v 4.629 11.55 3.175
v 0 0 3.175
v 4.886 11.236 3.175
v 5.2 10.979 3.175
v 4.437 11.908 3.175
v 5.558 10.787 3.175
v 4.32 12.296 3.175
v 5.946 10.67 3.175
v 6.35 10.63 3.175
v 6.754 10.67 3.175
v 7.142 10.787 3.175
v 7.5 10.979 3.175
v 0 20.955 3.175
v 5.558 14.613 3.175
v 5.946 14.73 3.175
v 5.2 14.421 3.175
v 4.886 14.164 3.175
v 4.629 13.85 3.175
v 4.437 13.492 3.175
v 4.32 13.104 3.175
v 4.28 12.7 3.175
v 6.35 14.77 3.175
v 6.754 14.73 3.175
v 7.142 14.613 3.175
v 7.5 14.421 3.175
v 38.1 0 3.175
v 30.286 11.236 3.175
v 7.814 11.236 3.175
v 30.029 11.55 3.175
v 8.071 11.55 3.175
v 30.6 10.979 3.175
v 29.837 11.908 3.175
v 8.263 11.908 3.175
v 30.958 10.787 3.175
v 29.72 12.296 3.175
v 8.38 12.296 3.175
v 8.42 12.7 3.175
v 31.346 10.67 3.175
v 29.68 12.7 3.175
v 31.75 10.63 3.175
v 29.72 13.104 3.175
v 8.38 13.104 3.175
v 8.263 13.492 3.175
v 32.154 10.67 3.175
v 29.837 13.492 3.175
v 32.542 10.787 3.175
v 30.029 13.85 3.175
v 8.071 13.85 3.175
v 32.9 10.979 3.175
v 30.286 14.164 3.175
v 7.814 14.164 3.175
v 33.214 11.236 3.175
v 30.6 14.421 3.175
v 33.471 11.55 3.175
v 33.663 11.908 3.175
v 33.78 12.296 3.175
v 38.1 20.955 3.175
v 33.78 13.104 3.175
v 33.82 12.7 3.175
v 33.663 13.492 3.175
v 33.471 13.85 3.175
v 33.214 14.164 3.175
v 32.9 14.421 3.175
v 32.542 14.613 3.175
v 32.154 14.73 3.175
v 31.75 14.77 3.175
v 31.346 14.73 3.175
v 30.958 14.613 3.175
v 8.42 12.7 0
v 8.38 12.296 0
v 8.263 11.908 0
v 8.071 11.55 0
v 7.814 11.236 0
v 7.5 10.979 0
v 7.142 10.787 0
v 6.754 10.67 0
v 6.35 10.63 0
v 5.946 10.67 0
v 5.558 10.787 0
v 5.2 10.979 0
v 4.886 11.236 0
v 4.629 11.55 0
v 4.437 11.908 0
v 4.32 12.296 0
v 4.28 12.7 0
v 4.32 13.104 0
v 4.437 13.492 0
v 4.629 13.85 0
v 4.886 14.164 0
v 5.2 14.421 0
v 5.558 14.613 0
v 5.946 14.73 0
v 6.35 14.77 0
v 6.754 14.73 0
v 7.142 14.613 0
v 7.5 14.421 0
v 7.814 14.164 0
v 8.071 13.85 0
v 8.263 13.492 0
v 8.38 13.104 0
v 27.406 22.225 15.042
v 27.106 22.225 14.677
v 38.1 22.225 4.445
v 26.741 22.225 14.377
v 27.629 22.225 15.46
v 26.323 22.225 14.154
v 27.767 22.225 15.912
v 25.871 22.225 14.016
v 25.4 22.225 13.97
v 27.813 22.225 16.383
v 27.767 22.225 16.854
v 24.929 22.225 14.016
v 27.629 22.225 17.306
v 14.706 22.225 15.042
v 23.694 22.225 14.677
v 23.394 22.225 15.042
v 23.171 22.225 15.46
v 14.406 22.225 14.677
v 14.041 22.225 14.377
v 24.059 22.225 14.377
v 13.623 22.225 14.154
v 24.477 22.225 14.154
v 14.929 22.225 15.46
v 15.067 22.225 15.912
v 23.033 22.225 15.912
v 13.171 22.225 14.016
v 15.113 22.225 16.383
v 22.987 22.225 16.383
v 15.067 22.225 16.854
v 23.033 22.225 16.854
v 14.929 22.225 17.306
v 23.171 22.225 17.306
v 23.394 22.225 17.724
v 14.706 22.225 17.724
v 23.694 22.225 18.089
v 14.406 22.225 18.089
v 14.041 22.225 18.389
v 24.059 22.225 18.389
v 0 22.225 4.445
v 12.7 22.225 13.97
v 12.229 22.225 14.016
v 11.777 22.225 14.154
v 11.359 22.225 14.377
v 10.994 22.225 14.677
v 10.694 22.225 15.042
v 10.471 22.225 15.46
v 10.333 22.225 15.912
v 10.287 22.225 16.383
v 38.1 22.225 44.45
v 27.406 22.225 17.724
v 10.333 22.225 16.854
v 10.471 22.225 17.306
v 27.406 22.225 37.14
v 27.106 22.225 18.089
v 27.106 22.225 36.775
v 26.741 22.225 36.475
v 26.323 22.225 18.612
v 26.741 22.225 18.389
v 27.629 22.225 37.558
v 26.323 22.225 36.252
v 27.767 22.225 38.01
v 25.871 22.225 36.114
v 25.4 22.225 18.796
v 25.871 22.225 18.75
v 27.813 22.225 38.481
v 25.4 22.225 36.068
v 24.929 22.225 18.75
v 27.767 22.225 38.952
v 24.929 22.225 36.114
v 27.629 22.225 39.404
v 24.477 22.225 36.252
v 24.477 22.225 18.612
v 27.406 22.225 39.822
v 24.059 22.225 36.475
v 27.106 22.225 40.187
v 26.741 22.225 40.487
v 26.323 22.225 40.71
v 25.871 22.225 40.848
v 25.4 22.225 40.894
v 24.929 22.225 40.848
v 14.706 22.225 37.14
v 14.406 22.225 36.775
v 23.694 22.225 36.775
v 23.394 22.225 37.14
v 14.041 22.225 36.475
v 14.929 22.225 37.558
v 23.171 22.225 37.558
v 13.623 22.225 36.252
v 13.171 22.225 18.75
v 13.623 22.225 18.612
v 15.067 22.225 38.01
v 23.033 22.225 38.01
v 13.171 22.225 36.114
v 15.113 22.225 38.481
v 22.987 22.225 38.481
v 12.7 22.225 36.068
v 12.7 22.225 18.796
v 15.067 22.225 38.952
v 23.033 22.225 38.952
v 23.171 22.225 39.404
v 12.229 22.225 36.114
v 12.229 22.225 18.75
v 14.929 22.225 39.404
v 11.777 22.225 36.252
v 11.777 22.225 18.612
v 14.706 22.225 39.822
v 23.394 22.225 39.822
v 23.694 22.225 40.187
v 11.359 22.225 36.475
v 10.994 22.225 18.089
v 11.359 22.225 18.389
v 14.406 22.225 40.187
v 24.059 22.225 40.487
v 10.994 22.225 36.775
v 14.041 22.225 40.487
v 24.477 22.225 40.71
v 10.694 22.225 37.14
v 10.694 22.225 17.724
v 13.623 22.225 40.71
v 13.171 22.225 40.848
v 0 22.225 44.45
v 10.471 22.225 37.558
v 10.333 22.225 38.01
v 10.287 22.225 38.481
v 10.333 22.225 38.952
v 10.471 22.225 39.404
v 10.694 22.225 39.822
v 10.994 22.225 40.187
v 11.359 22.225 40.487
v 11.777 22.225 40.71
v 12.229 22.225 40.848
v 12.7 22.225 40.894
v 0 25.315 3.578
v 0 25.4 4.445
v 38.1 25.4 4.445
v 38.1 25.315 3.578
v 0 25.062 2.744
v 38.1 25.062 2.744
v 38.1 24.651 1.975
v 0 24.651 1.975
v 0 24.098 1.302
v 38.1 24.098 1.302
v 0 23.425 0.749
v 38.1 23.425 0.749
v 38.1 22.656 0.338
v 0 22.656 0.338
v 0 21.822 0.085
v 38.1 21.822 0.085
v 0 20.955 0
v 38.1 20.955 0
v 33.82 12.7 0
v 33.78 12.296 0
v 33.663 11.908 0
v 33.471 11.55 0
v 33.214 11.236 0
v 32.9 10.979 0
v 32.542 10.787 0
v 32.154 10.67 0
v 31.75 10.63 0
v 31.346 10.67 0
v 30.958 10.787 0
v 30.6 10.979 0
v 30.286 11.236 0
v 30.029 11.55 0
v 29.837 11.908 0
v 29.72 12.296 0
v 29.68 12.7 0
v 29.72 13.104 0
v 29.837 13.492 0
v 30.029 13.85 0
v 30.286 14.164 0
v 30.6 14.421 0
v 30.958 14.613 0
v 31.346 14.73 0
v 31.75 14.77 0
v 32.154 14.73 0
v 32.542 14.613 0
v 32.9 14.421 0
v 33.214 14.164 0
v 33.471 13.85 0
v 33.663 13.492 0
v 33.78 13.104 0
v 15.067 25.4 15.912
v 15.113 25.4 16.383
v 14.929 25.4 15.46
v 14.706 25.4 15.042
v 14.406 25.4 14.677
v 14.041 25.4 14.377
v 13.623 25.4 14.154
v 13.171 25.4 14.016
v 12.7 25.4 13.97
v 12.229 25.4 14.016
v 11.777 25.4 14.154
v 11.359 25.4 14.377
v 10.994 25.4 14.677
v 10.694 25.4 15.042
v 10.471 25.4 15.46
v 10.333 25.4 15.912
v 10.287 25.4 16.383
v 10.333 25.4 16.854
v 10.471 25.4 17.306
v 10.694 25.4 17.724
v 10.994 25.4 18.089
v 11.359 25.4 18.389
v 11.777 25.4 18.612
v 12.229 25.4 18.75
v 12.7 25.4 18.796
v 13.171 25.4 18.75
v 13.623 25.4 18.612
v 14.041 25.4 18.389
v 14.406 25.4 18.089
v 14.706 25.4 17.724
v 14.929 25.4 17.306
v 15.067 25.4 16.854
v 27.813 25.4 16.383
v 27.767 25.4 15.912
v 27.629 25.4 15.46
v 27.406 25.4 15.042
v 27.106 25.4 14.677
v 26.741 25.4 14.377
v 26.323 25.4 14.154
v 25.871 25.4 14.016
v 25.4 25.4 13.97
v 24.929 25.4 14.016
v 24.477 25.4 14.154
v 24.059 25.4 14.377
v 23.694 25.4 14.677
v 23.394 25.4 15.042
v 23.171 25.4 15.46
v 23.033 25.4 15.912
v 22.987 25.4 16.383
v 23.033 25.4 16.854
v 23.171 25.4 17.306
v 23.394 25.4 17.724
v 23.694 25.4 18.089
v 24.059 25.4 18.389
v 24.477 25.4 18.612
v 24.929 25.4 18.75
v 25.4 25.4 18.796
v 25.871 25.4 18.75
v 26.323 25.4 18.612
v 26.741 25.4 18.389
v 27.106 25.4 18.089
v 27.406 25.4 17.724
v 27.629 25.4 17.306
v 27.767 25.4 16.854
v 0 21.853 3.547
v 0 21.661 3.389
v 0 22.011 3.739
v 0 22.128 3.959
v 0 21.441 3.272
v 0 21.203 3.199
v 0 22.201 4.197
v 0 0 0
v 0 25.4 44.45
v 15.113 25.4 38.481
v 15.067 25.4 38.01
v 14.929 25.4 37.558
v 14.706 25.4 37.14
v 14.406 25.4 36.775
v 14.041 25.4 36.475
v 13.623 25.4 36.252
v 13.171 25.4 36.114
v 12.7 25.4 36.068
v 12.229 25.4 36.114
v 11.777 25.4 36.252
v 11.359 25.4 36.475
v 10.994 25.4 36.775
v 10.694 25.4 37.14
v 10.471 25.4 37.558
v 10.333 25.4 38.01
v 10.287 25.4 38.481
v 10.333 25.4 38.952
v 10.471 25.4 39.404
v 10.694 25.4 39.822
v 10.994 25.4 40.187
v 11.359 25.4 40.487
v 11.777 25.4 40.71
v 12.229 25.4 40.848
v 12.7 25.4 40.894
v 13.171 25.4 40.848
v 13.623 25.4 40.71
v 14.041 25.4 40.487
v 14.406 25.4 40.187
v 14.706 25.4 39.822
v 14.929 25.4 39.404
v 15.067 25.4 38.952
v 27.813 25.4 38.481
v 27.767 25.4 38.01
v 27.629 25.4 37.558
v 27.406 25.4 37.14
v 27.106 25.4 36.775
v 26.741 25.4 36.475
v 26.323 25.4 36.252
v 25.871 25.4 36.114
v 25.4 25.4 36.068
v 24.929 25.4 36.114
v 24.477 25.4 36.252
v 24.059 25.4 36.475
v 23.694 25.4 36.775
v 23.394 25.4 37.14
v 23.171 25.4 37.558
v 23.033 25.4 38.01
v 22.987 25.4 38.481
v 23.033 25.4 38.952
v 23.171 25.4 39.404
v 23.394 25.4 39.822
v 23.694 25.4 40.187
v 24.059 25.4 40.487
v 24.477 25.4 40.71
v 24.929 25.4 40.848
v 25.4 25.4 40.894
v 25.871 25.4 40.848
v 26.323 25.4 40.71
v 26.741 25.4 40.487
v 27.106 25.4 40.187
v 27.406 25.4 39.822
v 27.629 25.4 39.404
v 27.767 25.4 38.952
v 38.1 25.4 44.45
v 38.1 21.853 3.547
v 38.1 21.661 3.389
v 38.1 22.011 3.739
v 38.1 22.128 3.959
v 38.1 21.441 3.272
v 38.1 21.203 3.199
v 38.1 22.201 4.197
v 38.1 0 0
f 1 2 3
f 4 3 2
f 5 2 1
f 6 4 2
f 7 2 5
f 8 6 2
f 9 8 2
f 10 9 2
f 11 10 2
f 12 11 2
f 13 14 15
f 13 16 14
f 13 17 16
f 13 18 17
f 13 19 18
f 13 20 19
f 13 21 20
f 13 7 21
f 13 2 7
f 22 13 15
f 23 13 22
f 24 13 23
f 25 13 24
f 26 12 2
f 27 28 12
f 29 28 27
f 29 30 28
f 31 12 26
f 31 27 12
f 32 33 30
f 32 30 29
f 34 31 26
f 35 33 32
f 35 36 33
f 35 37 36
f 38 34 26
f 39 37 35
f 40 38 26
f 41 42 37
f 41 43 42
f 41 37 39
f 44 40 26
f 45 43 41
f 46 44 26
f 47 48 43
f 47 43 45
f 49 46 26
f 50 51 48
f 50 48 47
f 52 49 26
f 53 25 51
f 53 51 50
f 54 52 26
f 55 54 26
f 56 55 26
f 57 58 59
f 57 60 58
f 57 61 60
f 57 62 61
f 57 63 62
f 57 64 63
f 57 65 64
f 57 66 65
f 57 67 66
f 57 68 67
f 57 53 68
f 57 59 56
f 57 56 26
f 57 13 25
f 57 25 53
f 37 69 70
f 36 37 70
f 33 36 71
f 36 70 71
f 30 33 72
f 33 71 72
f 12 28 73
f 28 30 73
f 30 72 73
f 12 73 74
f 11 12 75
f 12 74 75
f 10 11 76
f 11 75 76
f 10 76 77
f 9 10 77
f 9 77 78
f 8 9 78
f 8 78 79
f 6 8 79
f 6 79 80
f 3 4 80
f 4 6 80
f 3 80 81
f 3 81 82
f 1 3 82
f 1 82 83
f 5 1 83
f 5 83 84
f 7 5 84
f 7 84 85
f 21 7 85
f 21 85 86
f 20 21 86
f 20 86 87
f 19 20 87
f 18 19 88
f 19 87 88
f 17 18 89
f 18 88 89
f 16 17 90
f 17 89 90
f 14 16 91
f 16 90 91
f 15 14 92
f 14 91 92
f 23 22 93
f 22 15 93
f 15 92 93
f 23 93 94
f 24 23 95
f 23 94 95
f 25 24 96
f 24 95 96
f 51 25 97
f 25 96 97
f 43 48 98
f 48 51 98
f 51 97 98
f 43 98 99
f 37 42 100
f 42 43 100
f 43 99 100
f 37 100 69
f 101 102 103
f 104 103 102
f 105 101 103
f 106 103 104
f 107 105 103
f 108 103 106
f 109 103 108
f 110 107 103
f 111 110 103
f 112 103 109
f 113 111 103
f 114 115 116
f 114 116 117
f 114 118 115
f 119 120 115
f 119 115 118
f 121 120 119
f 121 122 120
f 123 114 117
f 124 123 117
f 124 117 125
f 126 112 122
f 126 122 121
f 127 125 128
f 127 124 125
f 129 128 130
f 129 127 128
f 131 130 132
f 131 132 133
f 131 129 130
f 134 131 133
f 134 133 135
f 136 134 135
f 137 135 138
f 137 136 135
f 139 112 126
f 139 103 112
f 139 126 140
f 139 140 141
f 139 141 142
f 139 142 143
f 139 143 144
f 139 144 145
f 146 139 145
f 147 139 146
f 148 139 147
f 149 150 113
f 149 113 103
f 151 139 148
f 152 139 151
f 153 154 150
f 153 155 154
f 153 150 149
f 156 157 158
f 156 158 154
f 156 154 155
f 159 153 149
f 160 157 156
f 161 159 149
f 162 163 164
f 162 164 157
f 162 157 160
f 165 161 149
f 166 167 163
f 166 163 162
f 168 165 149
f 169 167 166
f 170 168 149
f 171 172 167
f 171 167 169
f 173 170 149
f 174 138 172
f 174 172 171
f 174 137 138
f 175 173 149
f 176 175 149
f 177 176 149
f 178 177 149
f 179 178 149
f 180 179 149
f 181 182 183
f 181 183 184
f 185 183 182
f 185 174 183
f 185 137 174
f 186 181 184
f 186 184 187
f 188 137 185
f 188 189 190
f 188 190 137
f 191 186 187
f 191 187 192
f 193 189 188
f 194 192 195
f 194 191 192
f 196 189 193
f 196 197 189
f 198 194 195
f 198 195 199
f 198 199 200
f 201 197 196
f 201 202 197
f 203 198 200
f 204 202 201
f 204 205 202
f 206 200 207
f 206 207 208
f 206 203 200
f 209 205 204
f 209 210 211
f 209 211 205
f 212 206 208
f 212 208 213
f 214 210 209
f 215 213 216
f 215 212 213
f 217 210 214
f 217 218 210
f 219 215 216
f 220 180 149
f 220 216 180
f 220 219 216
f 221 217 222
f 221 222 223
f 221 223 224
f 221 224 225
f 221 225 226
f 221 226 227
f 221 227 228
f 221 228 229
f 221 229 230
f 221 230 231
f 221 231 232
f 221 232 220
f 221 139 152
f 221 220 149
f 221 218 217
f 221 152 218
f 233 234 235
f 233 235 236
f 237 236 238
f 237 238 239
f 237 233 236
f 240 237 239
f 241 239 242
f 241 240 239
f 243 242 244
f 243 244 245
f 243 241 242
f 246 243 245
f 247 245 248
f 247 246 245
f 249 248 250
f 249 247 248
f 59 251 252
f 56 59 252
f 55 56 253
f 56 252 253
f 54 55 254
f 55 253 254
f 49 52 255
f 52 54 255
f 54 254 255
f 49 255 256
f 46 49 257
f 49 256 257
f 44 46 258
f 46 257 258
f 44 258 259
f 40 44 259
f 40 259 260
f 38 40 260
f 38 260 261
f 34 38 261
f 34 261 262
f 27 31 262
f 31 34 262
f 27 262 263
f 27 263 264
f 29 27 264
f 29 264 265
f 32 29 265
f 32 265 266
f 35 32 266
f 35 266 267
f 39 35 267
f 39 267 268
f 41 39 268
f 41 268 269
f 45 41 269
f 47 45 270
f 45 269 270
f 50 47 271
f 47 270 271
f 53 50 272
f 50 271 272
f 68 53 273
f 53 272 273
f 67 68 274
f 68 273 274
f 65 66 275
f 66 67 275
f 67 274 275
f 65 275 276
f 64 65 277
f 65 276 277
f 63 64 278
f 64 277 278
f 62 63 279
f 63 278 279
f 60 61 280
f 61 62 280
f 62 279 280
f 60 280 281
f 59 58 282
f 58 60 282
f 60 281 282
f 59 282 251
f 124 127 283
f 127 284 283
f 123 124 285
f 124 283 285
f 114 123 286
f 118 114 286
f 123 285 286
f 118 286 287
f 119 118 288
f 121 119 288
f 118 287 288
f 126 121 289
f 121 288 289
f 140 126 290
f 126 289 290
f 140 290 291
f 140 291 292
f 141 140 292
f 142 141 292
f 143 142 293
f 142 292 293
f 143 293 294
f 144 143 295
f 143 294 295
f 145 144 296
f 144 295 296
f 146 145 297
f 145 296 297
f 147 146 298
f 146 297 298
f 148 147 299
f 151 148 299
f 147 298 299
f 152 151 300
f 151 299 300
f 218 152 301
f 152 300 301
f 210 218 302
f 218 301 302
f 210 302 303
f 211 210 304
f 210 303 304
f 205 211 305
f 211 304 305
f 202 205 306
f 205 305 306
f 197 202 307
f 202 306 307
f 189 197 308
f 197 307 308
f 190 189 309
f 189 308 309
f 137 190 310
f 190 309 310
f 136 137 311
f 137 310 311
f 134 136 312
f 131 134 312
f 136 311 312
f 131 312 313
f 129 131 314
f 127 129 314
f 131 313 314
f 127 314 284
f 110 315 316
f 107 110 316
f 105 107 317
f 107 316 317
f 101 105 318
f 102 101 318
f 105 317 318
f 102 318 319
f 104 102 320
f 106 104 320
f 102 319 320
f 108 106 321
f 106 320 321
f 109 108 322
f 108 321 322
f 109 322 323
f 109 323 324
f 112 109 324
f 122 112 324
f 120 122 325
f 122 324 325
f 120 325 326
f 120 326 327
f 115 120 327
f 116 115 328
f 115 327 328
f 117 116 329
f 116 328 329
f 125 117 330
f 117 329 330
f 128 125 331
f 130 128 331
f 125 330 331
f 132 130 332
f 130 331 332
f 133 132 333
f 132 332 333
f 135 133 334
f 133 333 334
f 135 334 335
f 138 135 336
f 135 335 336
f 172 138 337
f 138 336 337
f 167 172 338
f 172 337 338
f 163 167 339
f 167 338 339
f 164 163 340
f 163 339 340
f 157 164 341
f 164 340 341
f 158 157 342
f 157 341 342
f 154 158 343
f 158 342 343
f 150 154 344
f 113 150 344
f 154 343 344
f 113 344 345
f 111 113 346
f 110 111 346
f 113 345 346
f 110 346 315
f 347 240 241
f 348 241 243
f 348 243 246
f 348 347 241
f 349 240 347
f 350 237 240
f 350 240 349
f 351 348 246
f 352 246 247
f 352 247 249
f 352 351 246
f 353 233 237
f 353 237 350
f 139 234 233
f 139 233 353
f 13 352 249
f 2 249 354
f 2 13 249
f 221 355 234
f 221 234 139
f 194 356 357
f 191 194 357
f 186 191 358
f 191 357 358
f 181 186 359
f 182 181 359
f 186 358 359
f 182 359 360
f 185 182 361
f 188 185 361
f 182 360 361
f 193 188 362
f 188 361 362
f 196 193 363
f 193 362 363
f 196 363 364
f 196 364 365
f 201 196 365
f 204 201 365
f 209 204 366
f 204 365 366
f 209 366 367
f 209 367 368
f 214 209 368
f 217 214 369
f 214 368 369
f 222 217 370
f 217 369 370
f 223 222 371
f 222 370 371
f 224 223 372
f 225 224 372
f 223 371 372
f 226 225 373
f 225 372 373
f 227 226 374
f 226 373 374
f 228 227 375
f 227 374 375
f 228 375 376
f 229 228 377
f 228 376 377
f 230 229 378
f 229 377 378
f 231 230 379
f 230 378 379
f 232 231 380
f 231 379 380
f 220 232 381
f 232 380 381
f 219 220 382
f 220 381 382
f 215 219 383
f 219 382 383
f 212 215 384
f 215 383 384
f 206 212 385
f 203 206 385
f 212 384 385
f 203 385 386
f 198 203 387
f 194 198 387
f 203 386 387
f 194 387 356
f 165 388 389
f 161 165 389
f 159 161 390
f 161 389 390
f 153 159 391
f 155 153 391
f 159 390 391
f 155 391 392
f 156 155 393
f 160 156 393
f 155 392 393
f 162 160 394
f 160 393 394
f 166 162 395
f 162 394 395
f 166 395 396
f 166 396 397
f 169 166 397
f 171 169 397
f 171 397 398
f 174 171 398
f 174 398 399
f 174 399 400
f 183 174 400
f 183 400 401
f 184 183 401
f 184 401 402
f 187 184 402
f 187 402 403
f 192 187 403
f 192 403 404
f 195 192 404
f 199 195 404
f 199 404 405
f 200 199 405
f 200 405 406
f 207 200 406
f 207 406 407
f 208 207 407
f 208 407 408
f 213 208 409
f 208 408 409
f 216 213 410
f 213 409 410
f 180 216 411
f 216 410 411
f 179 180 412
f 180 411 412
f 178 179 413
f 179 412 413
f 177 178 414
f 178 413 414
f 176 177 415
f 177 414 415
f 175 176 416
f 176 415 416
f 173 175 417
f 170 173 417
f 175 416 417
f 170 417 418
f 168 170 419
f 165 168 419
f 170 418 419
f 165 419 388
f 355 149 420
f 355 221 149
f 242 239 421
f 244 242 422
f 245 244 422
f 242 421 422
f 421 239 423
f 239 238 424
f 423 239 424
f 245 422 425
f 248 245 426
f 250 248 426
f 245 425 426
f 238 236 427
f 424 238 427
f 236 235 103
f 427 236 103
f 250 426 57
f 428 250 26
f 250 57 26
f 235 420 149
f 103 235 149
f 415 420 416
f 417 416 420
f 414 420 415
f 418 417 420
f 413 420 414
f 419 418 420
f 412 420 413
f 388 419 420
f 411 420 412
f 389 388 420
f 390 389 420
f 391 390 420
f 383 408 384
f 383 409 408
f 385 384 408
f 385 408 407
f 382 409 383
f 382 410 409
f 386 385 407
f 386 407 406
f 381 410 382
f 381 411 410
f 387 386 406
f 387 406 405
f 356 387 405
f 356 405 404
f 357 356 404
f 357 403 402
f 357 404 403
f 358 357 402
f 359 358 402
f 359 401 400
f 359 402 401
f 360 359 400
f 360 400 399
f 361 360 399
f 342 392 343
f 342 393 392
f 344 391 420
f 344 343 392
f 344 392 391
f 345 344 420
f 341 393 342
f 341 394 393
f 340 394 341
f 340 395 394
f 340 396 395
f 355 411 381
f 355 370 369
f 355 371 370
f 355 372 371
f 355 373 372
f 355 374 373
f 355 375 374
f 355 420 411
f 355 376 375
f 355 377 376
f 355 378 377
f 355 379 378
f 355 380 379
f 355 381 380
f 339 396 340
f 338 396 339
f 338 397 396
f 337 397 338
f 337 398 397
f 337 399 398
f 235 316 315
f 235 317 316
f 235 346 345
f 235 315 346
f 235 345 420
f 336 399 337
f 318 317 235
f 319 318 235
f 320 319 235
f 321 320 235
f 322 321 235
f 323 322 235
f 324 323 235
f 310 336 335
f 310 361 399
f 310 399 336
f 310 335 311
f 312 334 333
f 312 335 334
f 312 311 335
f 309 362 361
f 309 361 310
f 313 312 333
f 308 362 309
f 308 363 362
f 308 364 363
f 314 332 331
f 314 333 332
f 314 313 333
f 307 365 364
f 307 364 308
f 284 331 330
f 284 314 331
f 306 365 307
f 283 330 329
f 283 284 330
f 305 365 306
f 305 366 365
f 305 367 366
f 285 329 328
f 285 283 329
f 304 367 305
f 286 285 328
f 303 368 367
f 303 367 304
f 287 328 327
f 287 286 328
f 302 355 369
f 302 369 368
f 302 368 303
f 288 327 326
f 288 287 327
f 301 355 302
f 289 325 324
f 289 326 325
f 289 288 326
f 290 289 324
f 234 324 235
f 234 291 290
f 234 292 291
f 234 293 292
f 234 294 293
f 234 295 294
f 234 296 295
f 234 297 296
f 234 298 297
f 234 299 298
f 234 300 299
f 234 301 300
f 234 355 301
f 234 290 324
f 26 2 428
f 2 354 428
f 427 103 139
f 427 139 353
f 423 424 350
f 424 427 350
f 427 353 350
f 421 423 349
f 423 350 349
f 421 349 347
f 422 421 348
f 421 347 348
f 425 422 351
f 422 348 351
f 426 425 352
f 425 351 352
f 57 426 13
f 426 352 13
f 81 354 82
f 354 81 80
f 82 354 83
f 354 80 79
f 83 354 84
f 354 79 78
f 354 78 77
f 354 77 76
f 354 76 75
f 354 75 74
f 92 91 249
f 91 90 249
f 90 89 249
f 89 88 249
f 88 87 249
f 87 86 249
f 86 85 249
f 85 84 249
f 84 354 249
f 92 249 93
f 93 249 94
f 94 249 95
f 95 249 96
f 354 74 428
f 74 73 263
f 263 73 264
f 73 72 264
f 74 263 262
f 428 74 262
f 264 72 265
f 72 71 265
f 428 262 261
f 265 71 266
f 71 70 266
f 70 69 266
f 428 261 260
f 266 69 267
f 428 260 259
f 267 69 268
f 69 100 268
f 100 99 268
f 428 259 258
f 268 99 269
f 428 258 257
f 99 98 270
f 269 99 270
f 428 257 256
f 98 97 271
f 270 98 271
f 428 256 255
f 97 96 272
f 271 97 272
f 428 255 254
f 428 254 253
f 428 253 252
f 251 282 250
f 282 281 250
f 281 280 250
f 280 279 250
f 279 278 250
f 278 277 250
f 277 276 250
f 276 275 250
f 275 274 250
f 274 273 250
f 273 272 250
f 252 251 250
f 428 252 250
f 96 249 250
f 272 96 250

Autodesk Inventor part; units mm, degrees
ref_plane "YZ Plane" through (0, 0, 0) normal (1, 0, 0) x (0, 1, 0)
ref_plane "XZ Plane" through (0, 0, 0) normal (0, 1, 0) x (-1, 0, 0)
ref_plane "XY Plane" through (0, 0, 0) normal (0, 0, 1) x (1, 0, 0)
sketch "Sketch1" plane through (0, 0, 0) normal (0, 0, 1) x (1, 0, 0)
  line L0 (0, 0) -> (38.1, 0)
  line L1 (38.1, 0) -> (38.1, 25.4)
  line L2 (38.1, 25.4) -> (0, 25.4)
  line L3 (0, 25.4) -> (0, 0)
  circle A0 centre (6.35, 12.7) radius 2.0701
  circle A1 centre (31.75, 12.7) radius 2.0701
  dimension "d0" = 38.1
  dimension "d1" = 25.4
  dimension "d2" = 4.1402
  dimension "d3" = 12.7
  dimension "d4" = 6.35
  dimension "d7" = 25.4
extrude "Plate1" add sketch "Sketch1" along normal blind 3.175
sketch "Sketch2" plane through (0, 22.225, 0) normal (0, 1, 0) x (-1, 0, 0)
  line L0 (-38.1, 0) -> (0, 0)
  line L1 (0, 0) -> (0, 44.45)
  line L2 (0, 44.45) -> (-38.1, 44.45)
  line L3 (-38.1, 44.45) -> (-38.1, 0)
edge flange "Flange1" height 44.45 angle 90 thickness 3.175 bend radius 1.27 thickness toward (0, 1, 0) relief tear relief width 3.175 relief depth 1.5875 edges at (19.05, 25.4, 3.175) wall of the first edge with corners at (38.1, 22.225, 0) (0, 22.225, 0) (0, 22.225, 44.45) (38.1, 22.225, 44.45)
bend "Bend1"
corner "Corner1"
sketch "Sketch3" plane through (0, 25.4, 44.45) normal (0, 1, 0) x (1, 0, 0)
  line L0 (38.1, 40.005) -> (0, 40.005) projected
  line L1 (38.1, 40.005) -> (38.1, 0) projected
  line L2 (28.575, 33.655) -> (9.525, 33.655) construction
  line L3 (9.525, 33.655) -> (9.525, 0.381) construction
  line L4 (9.525, 0.381) -> (28.575, 0.381) construction
  line L5 (28.575, 0.381) -> (28.575, 33.655) construction
  line L6 (28.575, 5.969) -> (9.525, 5.969) construction
  circle A0 centre (25.4, 5.969) radius 2.413
  line L7 (19.05, 0.381) -> (19.05, 33.655) construction
  circle A1 centre (12.7, 5.969) radius 2.413
  line L8 (28.575, 17.018) -> (9.525, 17.018) construction
  circle A2 centre (25.4, 28.067) radius 2.413
  circle A3 centre (12.7, 28.067) radius 2.413
  point P0 (0, 44.45)
  dimension "d23" = 19.05
  dimension "d24" = 33.274
  dimension "d25" = 5.588
  dimension "d26" = 3.175
  dimension "d27" = 4.826
  dimension "d28" = 9.525
  dimension "d29" = 6.35
extrude "Cut1" cut sketch "Sketch3" against normal blind 3.175
equation "\"d28\" = -0.5 * d23 + 0.5 * d0"
equation "\"d30\" = Thickness"
equation "\"d13\" = BendReliefWidth"
equation "\"d14\" = BendReliefDepth"
equation "\"d15\" = MinimumRemnant"
equation "\"d16\" = BendRadius"
equation "\"d20\" = CornerReliefSize"
equation "\"d21\" = GapSize"
equation "\"d22\" = JacobiRadiusSize"
equation "\"BendRadius\" = Thickness"
equation "\"BendReliefWidth\" = Thickness"
equation "\"BendReliefDepth\" = 0.5 * Thickness"
equation "\"CornerReliefSize\" = 4 * Thickness"
equation "\"MinimumRemnant\" = 2 * Thickness"
equation "\"TransitionRadius\" = BendRadius"
equation "\"JacobiRadiusSize\" = BendRadius"
equation "\"GapSize\" = Thickness"
equation "\"d12\" = BendRadius"
equation "\"Thickness\" = 3.175"
properties part number "Pneumatic Piston Back Flange (Custom)" material "Aluminum 6061"
